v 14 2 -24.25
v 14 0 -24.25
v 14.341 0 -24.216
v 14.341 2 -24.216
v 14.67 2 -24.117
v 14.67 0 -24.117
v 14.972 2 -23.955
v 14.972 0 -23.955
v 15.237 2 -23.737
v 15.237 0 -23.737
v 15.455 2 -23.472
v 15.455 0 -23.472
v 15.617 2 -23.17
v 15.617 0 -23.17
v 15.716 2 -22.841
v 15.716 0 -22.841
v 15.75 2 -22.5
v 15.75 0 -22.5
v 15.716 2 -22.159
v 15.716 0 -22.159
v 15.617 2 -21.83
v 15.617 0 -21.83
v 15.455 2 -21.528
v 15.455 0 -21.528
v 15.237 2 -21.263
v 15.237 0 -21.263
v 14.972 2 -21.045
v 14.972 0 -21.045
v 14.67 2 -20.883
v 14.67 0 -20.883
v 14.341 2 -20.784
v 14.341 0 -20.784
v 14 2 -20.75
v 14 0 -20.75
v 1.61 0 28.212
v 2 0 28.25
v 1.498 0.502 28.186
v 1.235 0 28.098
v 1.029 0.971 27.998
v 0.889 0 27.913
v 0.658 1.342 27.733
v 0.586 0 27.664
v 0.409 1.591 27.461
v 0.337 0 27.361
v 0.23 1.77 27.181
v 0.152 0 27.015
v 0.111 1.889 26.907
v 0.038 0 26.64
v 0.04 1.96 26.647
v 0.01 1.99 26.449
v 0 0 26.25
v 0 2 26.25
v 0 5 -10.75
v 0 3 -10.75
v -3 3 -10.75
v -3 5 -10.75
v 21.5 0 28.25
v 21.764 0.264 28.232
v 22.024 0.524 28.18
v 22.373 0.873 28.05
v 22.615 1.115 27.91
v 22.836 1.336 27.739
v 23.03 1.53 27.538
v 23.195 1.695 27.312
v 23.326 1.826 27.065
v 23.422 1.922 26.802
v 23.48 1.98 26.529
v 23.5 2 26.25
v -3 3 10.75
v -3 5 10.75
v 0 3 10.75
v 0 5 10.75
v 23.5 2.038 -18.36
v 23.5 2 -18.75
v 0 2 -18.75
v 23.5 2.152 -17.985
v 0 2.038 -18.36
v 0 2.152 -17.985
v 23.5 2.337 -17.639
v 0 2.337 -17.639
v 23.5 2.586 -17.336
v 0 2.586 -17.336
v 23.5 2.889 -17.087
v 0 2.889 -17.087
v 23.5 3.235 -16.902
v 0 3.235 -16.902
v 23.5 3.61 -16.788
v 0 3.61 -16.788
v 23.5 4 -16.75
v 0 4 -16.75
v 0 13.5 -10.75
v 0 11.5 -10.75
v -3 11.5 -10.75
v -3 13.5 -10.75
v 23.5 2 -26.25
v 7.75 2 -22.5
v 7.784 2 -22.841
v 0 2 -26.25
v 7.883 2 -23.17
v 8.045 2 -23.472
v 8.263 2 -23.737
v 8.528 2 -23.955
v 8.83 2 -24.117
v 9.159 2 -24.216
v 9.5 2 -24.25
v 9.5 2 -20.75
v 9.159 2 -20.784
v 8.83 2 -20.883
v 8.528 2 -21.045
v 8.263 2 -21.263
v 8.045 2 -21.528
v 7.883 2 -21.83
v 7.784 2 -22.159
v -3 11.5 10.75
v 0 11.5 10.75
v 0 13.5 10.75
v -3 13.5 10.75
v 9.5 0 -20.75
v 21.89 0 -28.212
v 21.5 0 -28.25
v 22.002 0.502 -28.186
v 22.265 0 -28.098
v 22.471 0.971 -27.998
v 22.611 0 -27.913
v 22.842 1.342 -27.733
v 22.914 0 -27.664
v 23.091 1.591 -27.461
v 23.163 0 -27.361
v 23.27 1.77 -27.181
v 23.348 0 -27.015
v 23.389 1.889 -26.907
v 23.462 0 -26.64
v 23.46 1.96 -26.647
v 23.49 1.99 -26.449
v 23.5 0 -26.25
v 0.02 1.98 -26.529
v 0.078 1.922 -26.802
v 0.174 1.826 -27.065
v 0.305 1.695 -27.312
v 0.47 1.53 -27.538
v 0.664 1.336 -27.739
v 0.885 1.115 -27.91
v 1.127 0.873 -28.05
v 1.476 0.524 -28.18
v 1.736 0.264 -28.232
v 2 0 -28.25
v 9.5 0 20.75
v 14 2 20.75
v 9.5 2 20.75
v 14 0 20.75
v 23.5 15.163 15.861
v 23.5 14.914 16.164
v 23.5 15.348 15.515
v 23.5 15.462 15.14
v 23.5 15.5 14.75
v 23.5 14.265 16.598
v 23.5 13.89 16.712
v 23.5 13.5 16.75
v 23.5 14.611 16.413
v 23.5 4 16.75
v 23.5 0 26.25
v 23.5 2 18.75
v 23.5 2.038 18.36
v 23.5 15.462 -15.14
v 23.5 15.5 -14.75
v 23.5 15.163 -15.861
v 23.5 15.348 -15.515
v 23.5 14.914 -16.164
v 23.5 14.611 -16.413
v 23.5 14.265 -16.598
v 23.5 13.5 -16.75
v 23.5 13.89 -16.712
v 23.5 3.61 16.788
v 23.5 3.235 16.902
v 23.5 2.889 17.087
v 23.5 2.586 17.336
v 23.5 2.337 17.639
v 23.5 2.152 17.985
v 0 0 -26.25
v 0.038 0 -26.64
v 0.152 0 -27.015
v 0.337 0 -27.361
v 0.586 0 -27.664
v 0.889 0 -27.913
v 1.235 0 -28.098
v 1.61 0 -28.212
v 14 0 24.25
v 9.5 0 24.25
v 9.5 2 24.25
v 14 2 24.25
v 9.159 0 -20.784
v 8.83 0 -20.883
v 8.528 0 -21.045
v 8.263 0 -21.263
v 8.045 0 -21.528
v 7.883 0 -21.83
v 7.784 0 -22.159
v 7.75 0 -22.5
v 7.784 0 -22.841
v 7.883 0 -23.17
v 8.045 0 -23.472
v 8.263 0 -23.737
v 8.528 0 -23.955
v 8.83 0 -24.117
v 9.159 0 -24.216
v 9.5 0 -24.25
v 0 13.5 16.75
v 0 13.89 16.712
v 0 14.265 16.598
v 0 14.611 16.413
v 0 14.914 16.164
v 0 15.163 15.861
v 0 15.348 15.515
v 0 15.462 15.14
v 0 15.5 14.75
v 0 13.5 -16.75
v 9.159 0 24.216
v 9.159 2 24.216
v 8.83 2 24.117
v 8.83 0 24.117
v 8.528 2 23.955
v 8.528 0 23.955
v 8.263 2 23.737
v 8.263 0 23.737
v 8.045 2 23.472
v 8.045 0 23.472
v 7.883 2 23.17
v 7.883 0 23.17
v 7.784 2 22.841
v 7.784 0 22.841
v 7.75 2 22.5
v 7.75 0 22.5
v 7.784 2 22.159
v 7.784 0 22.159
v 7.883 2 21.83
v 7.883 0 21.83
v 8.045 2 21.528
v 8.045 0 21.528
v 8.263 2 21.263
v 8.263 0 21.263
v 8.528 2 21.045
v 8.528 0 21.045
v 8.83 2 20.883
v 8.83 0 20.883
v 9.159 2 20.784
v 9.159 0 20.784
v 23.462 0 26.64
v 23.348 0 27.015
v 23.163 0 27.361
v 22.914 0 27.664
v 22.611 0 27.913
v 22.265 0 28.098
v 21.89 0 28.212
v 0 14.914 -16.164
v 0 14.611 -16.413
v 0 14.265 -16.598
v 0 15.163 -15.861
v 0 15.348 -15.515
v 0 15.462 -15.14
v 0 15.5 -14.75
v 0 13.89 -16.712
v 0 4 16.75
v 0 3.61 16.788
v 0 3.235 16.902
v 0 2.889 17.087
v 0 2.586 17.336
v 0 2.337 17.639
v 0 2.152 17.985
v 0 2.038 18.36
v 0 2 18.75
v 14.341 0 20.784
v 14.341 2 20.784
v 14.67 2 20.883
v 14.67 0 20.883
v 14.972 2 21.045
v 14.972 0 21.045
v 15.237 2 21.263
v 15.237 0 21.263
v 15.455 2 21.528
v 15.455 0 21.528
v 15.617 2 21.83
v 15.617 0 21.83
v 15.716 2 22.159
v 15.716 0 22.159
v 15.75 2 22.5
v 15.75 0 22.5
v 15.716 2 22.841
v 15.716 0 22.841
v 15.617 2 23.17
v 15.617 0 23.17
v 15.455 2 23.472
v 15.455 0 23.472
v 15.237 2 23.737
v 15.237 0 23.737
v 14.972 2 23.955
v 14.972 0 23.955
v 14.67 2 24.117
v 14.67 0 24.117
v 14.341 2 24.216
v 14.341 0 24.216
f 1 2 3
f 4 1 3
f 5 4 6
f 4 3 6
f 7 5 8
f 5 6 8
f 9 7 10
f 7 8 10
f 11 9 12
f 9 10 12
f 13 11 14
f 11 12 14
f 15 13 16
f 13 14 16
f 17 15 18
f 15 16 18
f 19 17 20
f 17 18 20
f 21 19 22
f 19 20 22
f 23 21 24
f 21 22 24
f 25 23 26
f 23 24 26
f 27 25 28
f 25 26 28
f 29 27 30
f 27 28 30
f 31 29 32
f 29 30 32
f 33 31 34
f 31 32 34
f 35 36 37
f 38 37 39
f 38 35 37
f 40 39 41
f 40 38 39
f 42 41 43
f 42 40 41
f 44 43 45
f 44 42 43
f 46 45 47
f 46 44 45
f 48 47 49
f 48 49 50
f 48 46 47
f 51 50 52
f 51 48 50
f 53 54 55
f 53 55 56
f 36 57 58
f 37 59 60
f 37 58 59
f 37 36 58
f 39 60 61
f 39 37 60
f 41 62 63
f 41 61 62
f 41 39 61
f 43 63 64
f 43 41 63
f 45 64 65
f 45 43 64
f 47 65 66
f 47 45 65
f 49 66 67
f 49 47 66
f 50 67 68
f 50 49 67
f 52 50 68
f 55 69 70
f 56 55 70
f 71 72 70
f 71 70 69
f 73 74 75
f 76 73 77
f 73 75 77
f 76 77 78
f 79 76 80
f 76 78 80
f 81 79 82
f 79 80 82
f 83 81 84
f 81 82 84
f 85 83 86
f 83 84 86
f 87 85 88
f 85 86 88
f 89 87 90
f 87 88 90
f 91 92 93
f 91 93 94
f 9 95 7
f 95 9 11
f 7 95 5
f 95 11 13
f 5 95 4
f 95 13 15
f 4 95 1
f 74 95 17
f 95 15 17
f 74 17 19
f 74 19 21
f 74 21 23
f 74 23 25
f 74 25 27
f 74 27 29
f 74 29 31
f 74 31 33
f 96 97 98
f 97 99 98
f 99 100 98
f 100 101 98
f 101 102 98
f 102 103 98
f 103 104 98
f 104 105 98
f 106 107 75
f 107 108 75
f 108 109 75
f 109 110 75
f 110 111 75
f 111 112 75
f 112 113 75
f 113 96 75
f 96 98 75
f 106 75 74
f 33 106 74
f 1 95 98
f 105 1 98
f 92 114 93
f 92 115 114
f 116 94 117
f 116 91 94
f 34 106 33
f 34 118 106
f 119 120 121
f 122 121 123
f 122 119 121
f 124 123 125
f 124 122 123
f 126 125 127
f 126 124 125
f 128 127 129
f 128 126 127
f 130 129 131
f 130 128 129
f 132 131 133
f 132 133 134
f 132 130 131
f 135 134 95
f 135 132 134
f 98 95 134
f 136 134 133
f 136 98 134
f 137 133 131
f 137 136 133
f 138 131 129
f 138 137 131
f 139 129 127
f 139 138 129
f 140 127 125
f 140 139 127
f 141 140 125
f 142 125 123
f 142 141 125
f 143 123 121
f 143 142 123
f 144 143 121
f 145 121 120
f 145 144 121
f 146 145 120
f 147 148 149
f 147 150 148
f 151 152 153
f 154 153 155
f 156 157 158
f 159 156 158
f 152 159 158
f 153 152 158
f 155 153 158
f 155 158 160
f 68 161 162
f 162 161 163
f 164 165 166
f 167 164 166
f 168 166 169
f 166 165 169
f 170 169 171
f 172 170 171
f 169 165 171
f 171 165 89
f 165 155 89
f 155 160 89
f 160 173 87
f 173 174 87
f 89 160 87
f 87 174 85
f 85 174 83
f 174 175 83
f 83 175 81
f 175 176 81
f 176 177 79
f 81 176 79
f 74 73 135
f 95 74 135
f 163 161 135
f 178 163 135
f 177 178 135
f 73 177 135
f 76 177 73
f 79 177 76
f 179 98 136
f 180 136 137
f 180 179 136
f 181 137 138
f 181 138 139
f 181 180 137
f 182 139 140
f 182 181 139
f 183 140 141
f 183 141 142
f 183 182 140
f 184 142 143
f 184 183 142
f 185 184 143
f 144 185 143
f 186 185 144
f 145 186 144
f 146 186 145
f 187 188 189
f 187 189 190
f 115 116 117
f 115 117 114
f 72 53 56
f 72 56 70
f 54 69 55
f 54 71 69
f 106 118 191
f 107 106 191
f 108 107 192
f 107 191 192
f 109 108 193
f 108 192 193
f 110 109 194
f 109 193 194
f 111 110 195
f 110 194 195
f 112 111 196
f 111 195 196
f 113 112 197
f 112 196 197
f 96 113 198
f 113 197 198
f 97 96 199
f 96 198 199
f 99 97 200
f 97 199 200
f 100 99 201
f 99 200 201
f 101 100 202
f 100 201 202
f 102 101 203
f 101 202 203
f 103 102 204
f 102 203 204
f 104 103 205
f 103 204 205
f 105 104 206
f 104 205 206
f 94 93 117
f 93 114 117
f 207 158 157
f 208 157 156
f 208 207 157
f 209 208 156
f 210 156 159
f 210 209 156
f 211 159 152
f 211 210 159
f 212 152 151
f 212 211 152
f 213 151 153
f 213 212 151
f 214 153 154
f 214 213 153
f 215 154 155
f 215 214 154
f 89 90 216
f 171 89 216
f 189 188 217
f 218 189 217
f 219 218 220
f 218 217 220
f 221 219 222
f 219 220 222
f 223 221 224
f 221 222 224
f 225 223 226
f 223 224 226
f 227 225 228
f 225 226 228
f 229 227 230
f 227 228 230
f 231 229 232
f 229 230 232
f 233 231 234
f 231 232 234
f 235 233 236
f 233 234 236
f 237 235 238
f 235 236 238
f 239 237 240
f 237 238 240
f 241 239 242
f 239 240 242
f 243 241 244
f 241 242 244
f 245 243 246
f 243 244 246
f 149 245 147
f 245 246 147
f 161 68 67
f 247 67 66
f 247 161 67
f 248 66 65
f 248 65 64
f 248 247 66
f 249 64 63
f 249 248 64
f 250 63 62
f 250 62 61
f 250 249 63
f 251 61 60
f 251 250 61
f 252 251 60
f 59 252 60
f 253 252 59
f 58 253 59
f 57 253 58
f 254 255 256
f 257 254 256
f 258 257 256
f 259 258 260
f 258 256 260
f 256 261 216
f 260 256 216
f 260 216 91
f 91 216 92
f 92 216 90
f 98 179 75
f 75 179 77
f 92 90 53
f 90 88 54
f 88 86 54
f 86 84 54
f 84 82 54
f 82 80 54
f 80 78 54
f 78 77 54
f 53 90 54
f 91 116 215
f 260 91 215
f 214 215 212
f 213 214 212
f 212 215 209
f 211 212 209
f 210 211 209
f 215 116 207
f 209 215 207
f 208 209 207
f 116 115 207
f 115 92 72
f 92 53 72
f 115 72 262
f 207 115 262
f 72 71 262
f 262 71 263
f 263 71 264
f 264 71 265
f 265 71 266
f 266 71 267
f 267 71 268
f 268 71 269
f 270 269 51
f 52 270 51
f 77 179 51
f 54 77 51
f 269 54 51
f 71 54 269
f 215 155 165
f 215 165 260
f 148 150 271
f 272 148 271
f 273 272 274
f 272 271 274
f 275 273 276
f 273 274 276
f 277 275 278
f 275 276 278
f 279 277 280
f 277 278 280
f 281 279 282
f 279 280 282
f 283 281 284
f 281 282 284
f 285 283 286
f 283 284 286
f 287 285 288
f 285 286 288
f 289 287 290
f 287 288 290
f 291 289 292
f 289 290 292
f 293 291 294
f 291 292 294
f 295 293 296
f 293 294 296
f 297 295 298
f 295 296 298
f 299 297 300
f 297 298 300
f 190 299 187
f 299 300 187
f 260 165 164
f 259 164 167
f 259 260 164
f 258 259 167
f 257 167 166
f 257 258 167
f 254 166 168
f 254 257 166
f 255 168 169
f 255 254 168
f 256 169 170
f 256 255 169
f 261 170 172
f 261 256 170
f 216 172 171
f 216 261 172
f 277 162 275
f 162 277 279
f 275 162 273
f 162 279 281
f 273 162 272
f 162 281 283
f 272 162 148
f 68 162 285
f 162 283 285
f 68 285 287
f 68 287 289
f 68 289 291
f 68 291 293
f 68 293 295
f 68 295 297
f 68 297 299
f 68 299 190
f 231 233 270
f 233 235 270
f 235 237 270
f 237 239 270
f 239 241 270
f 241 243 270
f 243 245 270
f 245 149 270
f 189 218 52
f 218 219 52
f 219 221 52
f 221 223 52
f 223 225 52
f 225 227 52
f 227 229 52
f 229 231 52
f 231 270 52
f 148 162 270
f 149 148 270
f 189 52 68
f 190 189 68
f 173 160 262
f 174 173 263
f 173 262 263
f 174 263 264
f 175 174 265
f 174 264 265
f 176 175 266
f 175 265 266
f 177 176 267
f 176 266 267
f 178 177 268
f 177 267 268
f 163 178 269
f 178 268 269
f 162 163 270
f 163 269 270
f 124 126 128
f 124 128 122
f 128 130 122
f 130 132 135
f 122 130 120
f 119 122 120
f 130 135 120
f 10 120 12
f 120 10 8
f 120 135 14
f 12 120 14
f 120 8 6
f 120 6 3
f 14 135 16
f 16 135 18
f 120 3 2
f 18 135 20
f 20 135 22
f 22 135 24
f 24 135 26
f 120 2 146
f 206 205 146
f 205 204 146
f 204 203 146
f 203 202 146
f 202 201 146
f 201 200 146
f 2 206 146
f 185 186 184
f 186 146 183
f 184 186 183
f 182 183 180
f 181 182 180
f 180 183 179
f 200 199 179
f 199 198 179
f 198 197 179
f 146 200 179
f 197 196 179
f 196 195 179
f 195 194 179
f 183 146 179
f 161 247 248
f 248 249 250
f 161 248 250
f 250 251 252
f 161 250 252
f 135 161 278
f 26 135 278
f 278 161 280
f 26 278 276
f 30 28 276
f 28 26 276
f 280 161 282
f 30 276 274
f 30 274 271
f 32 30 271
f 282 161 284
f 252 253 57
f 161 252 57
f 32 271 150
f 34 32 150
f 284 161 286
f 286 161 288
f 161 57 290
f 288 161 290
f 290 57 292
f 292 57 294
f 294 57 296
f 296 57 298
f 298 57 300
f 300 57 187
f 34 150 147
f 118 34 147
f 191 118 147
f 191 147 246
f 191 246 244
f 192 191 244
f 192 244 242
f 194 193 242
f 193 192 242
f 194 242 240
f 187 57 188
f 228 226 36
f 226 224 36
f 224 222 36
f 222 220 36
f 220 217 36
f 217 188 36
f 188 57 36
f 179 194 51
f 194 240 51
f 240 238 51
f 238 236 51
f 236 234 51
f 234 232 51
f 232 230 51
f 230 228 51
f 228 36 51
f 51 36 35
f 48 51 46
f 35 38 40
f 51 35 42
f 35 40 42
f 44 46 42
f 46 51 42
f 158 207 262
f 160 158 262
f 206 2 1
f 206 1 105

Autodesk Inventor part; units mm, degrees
sketch "Sketch_2" plane through (0, 0, 0) normal (0, 1, 0) x (-1, 0, 0)
  line L0 (0, -26.25) -> (0, 26.25)
  arc A0 (0, 26.25) -> (-2, 28.25) centre (-2, 26.25) ccw
  line L1 (-2, 28.25) -> (-21.5, 28.25)
  arc A1 (-21.5, 28.25) -> (-23.5, 26.25) centre (-21.5, 26.25) ccw
  line L2 (-23.5, 26.25) -> (-23.5, -26.25)
  arc A2 (-23.5, -26.25) -> (-21.5, -28.25) centre (-21.5, -26.25) ccw
  line L3 (-21.5, -28.25) -> (-2, -28.25)
  arc A3 (-2, -28.25) -> (0, -26.25) centre (-2, -26.25) ccw
  arc A4 (-9.5, 20.75) -> (-9.5, 24.25) centre (-9.5, 22.5) ccw
  line L4 (-9.5, 24.25) -> (-14, 24.25)
  arc A5 (-14, 24.25) -> (-14, 20.75) centre (-14, 22.5) ccw
  line L5 (-14, 20.75) -> (-9.5, 20.75)
  arc A6 (-9.5, -24.25) -> (-9.5, -20.75) centre (-9.5, -22.5) ccw
  line L6 (-9.5, -20.75) -> (-14, -20.75)
  arc A7 (-14, -20.75) -> (-14, -24.25) centre (-14, -22.5) ccw
  line L7 (-14, -24.25) -> (-9.5, -24.25)
extrude "Extrusion1" add sketch "Sketch_2" along normal blind 15.5
sketch "Sketch_1" plane through (0, 0, 0) normal (1, 0, 0) x (0, 1, 0)
  line L0 (-10, 50) -> (-10, -50)
  line L1 (-10, -50) -> (30, -50)
  line L2 (30, -50) -> (30, 50)
  line L3 (30, 50) -> (-10, 50)
  line L4 (0, 28.25) -> (0, -28.25)
  arc A0 (0, -28.25) -> (2, -26.25) centre (0, -26.25) ccw
  line L5 (2, -26.25) -> (2, -18.75)
  arc A1 (4, -16.75) -> (2, -18.75) centre (4, -18.75) ccw
  line L6 (4, -16.75) -> (13.5, -16.75)
  arc A2 (13.5, -16.75) -> (15.5, -14.75) centre (13.5, -14.75) ccw
  line L7 (15.5, -14.75) -> (15.5, 14.75)
  arc A3 (15.5, 14.75) -> (13.5, 16.75) centre (13.5, 14.75) ccw
  line L8 (13.5, 16.75) -> (4, 16.75)
  arc A4 (2, 18.75) -> (4, 16.75) centre (4, 18.75) ccw
  line L9 (2, 18.75) -> (2, 26.25)
  arc A5 (2, 26.25) -> (0, 28.25) centre (0, 26.25) ccw
extrude "Extrusion2" cut sketch "Sketch_1" along normal blind 24
sketch "Sketch_3" plane through (0, 0, 0) normal (1, 0, 0) x (0, 1, 0)
  line L0 (3, 10.75) -> (3, -10.75)
  line L1 (3, -10.75) -> (5, -10.75)
  line L2 (5, -10.75) -> (5, 10.75)
  line L3 (5, 10.75) -> (3, 10.75)
extrude "Extrusion3" add sketch "Sketch_3" against normal blind 3
sketch "Sketch_4" plane through (0, 0, 0) normal (1, 0, 0) x (0, 1, 0)
  line L0 (11.5, 10.75) -> (11.5, -10.75)
  line L1 (11.5, -10.75) -> (13.5, -10.75)
  line L2 (13.5, -10.75) -> (13.5, 10.75)
  line L3 (13.5, 10.75) -> (11.5, 10.75)
extrude "Extrusion4" add sketch "Sketch_4" against normal blind 3
ref_plane "magnet_to_mgplate_XY" through (-3, 8, 0) normal (1, 0, 0) x (0, 0, -1)
ref_plane "magnet_to_mgplate_YZ" through (-3, 8, 0) normal (0, 0, -1) x (0, 1, 0)
ref_plane "magnet_to_mgplate_ZX" through (-3, 8, 0) normal (0, 1, 0) x (1, 0, 0)
ref_plane "to_plate_XY" through (11.9, 0, -22.5) normal (0, 1, 0) x (1, 0, 0)
ref_plane "to_plate_YZ" through (11.9, 0, -22.5) normal (1, 0, 0) x (0, 0, -1)
ref_plane "to_plate_ZX" through (11.9, 0, -22.5) normal (0, 0, -1) x (0, 1, 0)
properties part number "MGCE15-5"
